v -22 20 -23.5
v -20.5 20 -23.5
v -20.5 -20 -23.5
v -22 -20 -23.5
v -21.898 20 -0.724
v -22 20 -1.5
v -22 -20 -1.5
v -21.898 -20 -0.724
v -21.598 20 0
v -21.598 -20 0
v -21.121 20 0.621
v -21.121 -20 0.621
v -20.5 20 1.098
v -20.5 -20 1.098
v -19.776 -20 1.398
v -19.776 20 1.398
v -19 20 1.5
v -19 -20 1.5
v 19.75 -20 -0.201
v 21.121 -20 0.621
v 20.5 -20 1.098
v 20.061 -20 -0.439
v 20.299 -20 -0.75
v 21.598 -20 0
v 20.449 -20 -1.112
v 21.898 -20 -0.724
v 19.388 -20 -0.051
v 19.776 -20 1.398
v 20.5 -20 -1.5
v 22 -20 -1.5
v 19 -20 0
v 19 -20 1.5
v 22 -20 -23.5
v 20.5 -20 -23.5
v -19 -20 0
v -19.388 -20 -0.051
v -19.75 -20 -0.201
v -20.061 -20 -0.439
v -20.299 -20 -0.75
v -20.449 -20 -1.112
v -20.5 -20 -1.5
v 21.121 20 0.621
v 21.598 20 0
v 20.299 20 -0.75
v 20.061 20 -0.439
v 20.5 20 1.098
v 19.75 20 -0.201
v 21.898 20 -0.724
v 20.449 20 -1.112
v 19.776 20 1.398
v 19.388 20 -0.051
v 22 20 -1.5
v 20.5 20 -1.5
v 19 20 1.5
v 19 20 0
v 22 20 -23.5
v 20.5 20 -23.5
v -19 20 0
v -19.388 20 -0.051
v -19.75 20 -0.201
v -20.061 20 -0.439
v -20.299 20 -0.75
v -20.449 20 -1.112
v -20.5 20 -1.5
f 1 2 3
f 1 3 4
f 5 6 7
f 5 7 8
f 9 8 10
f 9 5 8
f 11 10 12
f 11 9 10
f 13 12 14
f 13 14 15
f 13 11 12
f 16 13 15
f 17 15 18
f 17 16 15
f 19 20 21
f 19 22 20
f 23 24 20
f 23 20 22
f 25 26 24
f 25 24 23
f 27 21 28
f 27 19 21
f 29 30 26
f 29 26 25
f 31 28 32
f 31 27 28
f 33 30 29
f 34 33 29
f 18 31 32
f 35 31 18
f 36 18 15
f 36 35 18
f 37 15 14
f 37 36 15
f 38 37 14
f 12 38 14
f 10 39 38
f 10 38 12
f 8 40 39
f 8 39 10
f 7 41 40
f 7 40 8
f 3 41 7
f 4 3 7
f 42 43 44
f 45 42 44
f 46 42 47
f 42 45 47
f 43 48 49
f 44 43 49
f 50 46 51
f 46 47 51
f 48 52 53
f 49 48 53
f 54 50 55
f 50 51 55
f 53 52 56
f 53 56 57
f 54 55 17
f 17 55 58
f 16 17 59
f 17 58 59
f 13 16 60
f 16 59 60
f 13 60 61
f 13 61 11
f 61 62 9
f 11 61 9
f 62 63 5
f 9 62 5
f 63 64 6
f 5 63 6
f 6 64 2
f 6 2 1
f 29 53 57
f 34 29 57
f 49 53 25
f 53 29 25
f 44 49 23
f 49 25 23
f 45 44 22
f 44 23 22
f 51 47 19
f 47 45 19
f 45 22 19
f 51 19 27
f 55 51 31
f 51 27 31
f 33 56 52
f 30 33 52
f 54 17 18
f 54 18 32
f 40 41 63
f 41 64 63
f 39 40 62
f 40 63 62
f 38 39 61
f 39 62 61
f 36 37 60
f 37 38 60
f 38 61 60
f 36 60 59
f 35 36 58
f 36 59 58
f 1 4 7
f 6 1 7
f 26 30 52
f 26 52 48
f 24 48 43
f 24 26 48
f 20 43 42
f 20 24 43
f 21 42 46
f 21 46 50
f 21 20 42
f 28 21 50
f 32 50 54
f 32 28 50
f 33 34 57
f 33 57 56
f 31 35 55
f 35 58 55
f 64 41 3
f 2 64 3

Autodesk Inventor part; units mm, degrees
ref_plane "YZ Plane" through (0, 0, 0) normal (1, 0, 0) x (0, 1, 0)
ref_plane "XZ Plane" through (0, 0, 0) normal (0, 1, 0) x (-1, 0, 0)
ref_plane "XY Plane" through (0, 0, 0) normal (0, 0, 1) x (1, 0, 0)
sketch "スケッチ1" plane through (0, 0, 0) normal (0, 0, 1) x (1, 0, 0)
  line L0 (-22, 20) -> (22, 20)
  line L1 (22, 20) -> (22, -20)
  line L2 (22, -20) -> (-22, -20)
  line L3 (-22, -20) -> (-22, 20)
  line L4 (-22, 20) -> (22, -20) construction
  line L5 (22, 20) -> (-22, -20) construction
  point P0 (0, 0)
  point P1 (0, 0)
  dimension "d0" = 44
  dimension "d1" = 40
extrude "プレート1" add sketch "スケッチ1" along normal blind 1.5
sketch "スケッチ2" plane through (20.5, -20, 1.5) normal (1, 0, 0) x (0, 1, 0)
  line L0 (40, 0) -> (0, 0)
  line L1 (0, 0) -> (0, -25)
  line L2 (0, -25) -> (40, -25)
  line L3 (40, -25) -> (40, 0)
edge flange "フランジ1" height 25 angle 90 thickness 1.5 bend radius 1.5 thickness toward (1, 0, 0) relief tear relief width 1.5 relief depth 0.75 corner gap 1.5 corner form 0 edges at (22, 0, 0) (-22, 0, 0) wall of the first edge with corners at (20.5, 20, 1.5) (20.5, -20, 1.5) (20.5, -20, -23.5) (20.5, 20, -23.5)
bend "曲げ1"
corner "コーナー1"
equation "\"BendRadius\" = Thickness"
equation "\"BendReliefWidth\" = Thickness"
equation "\"BendReliefDepth\" = 0.5 * Thickness"
equation "\"CornerReliefSize\" = 4 * Thickness"
equation "\"MinimumRemnant\" = 2 * Thickness"
equation "\"TransitionRadius\" = BendRadius"
equation "\"JacobiRadiusSize\" = BendRadius"
equation "\"GapSize\" = Thickness"
properties part number "chest_cover_board_top"
